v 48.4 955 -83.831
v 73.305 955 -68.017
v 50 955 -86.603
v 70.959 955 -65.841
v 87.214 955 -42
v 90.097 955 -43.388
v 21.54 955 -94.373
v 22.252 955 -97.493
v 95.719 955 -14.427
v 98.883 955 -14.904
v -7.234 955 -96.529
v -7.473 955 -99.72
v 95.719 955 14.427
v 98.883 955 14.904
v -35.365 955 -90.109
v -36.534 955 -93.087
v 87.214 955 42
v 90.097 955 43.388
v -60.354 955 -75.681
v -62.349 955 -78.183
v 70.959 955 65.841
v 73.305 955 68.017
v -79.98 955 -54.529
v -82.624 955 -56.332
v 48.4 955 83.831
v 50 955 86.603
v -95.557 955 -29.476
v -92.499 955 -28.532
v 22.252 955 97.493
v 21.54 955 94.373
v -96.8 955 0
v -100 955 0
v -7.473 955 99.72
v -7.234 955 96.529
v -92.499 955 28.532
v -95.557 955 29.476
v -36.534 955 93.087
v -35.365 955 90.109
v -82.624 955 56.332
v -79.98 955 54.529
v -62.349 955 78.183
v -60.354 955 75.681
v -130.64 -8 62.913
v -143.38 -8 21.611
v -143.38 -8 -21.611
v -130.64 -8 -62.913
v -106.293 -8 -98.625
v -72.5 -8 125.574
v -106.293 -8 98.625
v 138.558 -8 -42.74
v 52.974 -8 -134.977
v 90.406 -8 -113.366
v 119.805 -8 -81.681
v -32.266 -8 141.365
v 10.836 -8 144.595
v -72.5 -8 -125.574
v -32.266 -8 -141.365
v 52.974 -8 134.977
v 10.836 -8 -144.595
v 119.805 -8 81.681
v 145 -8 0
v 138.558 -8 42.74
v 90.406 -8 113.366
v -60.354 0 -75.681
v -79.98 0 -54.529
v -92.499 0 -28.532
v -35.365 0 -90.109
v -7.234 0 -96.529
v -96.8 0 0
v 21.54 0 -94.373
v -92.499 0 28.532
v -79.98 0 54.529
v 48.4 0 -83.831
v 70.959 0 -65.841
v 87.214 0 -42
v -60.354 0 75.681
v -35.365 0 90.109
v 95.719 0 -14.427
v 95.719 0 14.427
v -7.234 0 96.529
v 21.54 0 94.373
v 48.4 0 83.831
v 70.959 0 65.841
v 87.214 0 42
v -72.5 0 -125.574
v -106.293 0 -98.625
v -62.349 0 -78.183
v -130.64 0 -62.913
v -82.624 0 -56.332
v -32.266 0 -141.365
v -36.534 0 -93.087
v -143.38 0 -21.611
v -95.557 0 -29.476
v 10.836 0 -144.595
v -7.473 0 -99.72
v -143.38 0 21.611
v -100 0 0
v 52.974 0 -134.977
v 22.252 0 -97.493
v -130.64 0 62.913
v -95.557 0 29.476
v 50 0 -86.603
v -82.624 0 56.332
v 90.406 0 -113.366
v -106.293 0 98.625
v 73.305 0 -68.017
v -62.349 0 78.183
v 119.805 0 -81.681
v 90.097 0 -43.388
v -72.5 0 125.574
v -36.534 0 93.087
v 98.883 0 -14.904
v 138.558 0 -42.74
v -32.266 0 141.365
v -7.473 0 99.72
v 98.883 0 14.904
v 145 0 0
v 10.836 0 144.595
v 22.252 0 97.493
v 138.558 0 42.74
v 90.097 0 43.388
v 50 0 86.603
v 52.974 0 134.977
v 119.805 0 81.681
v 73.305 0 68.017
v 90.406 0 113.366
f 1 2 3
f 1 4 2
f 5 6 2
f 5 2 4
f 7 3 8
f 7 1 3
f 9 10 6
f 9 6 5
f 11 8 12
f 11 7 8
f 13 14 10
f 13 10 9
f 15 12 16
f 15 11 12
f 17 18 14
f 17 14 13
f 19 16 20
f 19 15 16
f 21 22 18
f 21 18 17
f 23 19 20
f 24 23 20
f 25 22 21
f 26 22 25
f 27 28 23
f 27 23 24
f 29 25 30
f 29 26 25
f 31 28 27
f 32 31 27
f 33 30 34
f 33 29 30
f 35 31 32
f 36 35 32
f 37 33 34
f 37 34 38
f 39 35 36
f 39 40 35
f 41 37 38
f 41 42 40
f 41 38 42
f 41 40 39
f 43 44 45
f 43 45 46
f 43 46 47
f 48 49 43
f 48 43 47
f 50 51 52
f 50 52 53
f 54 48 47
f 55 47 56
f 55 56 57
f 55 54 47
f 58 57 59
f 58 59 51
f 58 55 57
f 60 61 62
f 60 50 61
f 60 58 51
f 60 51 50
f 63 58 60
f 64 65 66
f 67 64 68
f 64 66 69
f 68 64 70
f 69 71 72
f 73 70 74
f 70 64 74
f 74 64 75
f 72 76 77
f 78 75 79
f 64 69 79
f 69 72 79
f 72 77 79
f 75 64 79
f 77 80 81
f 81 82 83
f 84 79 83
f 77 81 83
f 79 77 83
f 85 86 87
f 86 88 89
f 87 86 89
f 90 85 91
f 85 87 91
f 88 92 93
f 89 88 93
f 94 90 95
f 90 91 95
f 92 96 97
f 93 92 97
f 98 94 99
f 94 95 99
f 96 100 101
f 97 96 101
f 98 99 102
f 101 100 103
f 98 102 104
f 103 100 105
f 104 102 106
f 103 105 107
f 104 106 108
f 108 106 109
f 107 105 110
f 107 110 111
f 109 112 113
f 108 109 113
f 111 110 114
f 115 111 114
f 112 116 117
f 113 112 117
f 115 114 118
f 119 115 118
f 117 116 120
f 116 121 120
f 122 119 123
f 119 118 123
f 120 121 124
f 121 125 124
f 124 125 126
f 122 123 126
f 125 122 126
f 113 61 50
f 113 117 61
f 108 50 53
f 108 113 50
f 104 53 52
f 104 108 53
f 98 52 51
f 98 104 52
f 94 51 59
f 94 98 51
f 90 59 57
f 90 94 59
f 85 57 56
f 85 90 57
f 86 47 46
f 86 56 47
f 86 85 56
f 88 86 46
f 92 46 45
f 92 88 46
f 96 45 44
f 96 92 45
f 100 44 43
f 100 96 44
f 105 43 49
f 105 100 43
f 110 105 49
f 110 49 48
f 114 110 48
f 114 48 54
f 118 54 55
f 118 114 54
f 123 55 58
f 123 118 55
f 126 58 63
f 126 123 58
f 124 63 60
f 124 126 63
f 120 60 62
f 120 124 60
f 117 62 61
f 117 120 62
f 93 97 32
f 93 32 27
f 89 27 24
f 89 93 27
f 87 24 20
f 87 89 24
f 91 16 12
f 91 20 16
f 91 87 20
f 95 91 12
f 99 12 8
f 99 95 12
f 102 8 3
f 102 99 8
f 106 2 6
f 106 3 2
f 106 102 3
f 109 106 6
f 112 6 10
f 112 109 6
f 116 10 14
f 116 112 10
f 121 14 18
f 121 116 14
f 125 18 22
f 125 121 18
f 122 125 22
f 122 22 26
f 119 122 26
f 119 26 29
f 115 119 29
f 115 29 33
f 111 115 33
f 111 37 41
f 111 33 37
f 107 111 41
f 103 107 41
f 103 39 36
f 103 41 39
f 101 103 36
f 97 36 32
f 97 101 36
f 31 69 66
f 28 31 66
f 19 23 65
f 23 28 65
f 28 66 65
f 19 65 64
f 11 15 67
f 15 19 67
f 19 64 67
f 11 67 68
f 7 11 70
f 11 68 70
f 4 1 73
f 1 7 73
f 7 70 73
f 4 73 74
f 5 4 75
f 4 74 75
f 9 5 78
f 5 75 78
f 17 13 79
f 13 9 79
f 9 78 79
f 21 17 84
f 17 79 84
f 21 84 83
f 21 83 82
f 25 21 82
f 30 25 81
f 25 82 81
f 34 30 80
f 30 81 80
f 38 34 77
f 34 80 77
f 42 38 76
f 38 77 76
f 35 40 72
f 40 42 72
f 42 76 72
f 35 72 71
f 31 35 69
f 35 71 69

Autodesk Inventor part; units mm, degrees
ref_plane "YZ Plane" through (0, 0, 0) normal (1, 0, 0) x (0, 1, 0)
ref_plane "XZ Plane" through (0, 0, 0) normal (0, 1, 0) x (-1, 0, 0)
ref_plane "XY Plane" through (0, 0, 0) normal (0, 0, 1) x (1, 0, 0)
sketch "Boceto1" plane through (0, 0, 0) normal (0, 1, 0) x (-1, 0, 0)
  circle A0 centre (0, 0) radius 100
  circle A1 centre (0, 0) radius 96.8
  dimension "d0" = 200
  dimension "d1" = 193.6
extrude "Extrusión1" add sketch "Boceto1" along normal blind 955
sketch "Boceto2" plane through (0, 0, 0) normal (0, -1, 0) x (1, 0, 0)
  circle A0 centre (0, 0) radius 145
  dimension "d4" = 290
extrude "Extrusión2" add sketch "Boceto2" along normal blind 8
sketch "Boceto3" plane through (0, 955, 0) normal (0, 1, 0) x (1, 0, 0)
  point P0 (0, 0)
properties part number "Cuerpo"
